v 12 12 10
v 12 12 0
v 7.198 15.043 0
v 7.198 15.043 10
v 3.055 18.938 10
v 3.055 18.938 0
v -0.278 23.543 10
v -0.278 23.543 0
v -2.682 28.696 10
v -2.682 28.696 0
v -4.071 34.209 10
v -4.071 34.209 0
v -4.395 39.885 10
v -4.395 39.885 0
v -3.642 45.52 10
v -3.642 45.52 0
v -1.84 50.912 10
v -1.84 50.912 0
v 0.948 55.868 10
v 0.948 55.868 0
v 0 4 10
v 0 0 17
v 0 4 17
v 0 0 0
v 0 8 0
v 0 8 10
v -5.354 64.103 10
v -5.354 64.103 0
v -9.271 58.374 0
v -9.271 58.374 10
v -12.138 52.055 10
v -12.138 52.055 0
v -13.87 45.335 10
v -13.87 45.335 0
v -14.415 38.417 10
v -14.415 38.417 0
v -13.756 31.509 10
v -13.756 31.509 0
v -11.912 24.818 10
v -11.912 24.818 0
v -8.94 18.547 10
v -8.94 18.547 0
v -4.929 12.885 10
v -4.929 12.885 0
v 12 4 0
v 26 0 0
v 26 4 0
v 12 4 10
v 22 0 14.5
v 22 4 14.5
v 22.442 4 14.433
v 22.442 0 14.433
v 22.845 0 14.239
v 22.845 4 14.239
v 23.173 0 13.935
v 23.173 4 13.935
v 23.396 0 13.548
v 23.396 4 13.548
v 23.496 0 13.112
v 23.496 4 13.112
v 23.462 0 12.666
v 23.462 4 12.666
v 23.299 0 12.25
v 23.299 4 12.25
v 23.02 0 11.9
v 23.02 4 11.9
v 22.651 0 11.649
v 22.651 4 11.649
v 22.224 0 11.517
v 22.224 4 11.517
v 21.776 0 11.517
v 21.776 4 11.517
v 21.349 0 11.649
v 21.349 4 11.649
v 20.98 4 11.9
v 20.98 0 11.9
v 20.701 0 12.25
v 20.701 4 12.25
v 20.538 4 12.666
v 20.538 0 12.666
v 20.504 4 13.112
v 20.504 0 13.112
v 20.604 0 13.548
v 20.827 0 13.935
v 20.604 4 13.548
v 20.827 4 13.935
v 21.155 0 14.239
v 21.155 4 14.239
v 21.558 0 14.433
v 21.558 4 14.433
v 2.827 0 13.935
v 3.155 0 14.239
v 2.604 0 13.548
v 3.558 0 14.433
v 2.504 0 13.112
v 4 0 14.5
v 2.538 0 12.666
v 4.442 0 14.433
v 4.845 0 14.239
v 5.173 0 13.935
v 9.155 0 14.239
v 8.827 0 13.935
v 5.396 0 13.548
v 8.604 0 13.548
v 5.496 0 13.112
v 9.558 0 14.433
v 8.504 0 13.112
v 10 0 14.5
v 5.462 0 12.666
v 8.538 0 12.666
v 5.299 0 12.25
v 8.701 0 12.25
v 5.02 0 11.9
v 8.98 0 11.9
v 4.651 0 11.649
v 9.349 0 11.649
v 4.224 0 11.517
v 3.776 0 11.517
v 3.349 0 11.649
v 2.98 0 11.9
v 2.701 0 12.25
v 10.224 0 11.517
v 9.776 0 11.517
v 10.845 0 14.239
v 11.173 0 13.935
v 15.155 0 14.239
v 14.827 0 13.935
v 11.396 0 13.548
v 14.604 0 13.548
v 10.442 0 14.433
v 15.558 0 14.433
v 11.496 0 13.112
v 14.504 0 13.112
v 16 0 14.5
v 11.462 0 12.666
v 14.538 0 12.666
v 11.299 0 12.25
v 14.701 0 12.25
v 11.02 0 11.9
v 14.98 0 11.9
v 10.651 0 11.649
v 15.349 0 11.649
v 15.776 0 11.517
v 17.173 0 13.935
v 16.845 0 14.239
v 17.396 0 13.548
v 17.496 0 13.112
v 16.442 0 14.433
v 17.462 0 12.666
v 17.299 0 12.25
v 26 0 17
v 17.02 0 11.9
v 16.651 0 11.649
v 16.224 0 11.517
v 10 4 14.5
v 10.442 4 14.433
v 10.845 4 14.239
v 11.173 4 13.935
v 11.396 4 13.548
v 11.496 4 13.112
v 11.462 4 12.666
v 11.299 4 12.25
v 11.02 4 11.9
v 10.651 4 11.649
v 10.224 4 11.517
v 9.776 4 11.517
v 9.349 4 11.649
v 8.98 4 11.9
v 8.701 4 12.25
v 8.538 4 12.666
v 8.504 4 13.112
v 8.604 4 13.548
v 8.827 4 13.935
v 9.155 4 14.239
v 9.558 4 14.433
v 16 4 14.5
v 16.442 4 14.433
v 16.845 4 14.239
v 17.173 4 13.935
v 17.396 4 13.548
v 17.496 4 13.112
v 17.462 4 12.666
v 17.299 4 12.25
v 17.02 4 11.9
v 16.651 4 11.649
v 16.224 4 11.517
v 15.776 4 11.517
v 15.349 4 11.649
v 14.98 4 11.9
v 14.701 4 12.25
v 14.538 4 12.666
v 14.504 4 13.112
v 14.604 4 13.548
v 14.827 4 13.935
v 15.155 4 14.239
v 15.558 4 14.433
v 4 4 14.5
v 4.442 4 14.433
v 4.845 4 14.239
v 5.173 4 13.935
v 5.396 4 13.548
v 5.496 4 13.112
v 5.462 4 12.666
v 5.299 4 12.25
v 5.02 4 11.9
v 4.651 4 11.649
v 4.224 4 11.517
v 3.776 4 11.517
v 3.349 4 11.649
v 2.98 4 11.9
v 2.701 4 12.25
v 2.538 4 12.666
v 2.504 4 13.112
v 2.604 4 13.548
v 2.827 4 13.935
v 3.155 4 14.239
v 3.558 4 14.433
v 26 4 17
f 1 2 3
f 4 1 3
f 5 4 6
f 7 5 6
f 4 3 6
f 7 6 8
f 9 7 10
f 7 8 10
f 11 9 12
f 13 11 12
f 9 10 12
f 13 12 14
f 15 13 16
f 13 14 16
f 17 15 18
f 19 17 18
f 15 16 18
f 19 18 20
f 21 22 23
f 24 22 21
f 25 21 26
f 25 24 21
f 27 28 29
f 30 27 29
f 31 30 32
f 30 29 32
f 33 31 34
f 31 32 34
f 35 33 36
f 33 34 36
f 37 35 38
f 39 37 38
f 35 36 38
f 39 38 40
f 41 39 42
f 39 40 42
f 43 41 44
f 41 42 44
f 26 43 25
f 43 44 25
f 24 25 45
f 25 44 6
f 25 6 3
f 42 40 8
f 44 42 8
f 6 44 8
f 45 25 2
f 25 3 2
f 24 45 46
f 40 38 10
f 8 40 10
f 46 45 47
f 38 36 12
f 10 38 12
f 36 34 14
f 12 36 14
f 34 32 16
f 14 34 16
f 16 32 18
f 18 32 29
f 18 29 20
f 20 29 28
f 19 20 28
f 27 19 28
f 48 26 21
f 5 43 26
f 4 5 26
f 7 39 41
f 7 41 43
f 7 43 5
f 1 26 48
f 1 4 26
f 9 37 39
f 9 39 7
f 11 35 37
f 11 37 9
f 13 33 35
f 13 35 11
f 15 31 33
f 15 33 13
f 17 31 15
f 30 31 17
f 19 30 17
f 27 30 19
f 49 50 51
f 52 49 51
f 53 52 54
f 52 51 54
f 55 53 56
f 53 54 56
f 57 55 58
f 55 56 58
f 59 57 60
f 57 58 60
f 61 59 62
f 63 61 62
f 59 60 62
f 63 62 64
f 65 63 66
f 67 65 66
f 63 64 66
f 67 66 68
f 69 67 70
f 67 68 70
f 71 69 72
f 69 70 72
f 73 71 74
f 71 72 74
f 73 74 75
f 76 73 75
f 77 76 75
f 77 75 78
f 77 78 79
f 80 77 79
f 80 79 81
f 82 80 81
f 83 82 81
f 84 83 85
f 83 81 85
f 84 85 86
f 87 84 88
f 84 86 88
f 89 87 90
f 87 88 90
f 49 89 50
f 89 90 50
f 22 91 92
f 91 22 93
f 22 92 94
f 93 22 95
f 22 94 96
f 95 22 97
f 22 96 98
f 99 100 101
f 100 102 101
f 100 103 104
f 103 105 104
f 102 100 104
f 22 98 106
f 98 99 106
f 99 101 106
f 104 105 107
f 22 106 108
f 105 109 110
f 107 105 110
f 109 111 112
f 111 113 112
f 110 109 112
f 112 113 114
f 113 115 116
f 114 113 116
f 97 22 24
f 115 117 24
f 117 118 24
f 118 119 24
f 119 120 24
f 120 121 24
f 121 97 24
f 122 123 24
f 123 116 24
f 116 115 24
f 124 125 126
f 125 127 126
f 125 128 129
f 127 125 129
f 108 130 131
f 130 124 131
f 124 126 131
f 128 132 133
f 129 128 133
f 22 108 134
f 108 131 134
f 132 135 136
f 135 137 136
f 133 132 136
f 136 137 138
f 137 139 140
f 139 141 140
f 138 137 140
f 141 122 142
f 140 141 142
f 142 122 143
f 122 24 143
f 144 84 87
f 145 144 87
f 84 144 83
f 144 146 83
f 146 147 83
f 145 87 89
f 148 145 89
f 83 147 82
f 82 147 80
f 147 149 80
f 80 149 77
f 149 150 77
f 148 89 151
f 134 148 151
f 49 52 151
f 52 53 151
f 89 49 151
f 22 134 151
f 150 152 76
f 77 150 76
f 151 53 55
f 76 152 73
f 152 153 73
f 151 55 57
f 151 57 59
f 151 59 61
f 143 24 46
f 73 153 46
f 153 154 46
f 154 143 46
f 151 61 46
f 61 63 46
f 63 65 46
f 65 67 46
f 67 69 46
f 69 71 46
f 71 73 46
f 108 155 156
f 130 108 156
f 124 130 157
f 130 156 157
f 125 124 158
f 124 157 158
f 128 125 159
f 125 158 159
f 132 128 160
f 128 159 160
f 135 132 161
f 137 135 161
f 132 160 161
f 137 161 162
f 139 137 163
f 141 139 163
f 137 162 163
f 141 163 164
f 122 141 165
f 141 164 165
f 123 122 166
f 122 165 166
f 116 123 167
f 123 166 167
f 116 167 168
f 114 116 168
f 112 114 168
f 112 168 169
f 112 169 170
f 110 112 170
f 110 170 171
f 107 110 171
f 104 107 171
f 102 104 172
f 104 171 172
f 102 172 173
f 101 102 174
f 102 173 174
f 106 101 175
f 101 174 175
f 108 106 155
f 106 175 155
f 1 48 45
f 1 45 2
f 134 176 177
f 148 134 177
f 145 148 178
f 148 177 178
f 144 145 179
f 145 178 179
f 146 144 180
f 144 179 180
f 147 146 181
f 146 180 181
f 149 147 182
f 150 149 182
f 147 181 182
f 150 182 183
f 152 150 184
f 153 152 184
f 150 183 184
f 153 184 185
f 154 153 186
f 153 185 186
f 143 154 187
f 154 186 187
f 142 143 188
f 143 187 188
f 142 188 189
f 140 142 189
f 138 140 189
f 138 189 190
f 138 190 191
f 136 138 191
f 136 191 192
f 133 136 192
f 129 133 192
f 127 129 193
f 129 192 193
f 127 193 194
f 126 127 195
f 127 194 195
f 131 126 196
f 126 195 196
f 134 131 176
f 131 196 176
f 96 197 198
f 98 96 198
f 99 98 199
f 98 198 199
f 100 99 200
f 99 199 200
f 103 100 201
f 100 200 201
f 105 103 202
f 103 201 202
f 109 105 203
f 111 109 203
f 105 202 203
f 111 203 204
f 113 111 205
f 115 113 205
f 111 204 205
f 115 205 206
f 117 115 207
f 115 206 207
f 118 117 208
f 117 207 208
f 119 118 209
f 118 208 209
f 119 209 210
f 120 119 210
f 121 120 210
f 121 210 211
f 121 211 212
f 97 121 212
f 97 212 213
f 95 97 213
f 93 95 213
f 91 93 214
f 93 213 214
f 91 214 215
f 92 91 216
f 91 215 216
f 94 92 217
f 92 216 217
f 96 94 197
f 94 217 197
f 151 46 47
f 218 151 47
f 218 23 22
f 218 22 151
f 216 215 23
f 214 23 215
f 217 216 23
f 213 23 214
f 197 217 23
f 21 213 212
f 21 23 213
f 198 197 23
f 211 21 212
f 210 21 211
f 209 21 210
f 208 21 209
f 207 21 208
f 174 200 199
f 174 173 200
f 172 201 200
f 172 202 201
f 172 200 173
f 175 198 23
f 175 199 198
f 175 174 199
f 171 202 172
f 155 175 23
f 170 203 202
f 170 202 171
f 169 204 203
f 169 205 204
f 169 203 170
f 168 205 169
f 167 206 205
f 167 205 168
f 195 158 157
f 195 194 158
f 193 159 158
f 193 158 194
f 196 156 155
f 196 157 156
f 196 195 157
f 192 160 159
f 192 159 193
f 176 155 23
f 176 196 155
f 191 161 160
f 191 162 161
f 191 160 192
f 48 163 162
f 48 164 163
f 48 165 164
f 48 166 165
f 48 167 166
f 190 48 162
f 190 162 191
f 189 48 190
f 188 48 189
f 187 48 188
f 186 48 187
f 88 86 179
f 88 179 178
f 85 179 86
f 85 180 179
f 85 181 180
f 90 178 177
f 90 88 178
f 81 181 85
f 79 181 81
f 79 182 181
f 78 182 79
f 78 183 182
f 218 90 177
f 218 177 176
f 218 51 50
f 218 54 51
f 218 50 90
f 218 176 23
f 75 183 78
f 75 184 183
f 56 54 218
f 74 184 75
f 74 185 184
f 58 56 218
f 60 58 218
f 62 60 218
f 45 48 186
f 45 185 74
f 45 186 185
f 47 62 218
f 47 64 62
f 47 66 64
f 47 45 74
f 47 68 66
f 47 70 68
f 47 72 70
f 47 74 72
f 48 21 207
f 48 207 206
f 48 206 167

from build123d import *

# Parameters (mm, degrees)
BOSS_EXTRUDE1_DEPTH = 10
SKETCH3_W           = 26
SKETCH3_H           = 4
BOSS_EXTRUDE2_DEPTH = 17
SKETCH4_R           = 1.5
CUT_EXTRUDE1_DEPTH  = 4


with BuildPart() as part:
    # Sketch1 → Boss-Extrude1 (new body)
    with BuildSketch(Plane.XY):
        with BuildLine():
            Line((0.947795447, 55.867567374), (-5.354013975, 64.102890964))
            ThreePointArc((-5.354013975, 64.102890964), (-14.235235054, 34.948420067), (0, 8))
            Line((0, 8), (0, 4))
            Line((0, 4), (12, 4))
            Line((12, 4), (12, 12))
            ThreePointArc((12, 12), (-3.507060252, 31.419133439), (0.947795447, 55.867567374))
        make_face()
    extrude(amount=BOSS_EXTRUDE1_DEPTH)

    # Sketch3 → Boss-Extrude2 (add)
    with BuildSketch(Plane.XY):
        with Locations((13, 2)):
            Rectangle(SKETCH3_W, SKETCH3_H)
    extrude(amount=BOSS_EXTRUDE2_DEPTH)

    # Sketch4 → Cut-Extrude1 (cut)
    with BuildSketch(Plane(origin=(0, 4, 0), x_dir=(1, 0, 0), z_dir=(0, 1, 0))):
        with Locations(Location((4, -13, 0), (0, 0, 270))):
            Circle(SKETCH4_R)
        with Locations(Location((10, -13, 0), (0, 0, 270))):
            Circle(SKETCH4_R)
        with Locations(Location((16, -13, 0), (0, 0, 270))):
            Circle(SKETCH4_R)
        with Locations(Location((22, -13, 0), (0, 0, 270))):
            Circle(SKETCH4_R)
    extrude(amount=-CUT_EXTRUDE1_DEPTH, mode=Mode.SUBTRACT)


solid = part.part
